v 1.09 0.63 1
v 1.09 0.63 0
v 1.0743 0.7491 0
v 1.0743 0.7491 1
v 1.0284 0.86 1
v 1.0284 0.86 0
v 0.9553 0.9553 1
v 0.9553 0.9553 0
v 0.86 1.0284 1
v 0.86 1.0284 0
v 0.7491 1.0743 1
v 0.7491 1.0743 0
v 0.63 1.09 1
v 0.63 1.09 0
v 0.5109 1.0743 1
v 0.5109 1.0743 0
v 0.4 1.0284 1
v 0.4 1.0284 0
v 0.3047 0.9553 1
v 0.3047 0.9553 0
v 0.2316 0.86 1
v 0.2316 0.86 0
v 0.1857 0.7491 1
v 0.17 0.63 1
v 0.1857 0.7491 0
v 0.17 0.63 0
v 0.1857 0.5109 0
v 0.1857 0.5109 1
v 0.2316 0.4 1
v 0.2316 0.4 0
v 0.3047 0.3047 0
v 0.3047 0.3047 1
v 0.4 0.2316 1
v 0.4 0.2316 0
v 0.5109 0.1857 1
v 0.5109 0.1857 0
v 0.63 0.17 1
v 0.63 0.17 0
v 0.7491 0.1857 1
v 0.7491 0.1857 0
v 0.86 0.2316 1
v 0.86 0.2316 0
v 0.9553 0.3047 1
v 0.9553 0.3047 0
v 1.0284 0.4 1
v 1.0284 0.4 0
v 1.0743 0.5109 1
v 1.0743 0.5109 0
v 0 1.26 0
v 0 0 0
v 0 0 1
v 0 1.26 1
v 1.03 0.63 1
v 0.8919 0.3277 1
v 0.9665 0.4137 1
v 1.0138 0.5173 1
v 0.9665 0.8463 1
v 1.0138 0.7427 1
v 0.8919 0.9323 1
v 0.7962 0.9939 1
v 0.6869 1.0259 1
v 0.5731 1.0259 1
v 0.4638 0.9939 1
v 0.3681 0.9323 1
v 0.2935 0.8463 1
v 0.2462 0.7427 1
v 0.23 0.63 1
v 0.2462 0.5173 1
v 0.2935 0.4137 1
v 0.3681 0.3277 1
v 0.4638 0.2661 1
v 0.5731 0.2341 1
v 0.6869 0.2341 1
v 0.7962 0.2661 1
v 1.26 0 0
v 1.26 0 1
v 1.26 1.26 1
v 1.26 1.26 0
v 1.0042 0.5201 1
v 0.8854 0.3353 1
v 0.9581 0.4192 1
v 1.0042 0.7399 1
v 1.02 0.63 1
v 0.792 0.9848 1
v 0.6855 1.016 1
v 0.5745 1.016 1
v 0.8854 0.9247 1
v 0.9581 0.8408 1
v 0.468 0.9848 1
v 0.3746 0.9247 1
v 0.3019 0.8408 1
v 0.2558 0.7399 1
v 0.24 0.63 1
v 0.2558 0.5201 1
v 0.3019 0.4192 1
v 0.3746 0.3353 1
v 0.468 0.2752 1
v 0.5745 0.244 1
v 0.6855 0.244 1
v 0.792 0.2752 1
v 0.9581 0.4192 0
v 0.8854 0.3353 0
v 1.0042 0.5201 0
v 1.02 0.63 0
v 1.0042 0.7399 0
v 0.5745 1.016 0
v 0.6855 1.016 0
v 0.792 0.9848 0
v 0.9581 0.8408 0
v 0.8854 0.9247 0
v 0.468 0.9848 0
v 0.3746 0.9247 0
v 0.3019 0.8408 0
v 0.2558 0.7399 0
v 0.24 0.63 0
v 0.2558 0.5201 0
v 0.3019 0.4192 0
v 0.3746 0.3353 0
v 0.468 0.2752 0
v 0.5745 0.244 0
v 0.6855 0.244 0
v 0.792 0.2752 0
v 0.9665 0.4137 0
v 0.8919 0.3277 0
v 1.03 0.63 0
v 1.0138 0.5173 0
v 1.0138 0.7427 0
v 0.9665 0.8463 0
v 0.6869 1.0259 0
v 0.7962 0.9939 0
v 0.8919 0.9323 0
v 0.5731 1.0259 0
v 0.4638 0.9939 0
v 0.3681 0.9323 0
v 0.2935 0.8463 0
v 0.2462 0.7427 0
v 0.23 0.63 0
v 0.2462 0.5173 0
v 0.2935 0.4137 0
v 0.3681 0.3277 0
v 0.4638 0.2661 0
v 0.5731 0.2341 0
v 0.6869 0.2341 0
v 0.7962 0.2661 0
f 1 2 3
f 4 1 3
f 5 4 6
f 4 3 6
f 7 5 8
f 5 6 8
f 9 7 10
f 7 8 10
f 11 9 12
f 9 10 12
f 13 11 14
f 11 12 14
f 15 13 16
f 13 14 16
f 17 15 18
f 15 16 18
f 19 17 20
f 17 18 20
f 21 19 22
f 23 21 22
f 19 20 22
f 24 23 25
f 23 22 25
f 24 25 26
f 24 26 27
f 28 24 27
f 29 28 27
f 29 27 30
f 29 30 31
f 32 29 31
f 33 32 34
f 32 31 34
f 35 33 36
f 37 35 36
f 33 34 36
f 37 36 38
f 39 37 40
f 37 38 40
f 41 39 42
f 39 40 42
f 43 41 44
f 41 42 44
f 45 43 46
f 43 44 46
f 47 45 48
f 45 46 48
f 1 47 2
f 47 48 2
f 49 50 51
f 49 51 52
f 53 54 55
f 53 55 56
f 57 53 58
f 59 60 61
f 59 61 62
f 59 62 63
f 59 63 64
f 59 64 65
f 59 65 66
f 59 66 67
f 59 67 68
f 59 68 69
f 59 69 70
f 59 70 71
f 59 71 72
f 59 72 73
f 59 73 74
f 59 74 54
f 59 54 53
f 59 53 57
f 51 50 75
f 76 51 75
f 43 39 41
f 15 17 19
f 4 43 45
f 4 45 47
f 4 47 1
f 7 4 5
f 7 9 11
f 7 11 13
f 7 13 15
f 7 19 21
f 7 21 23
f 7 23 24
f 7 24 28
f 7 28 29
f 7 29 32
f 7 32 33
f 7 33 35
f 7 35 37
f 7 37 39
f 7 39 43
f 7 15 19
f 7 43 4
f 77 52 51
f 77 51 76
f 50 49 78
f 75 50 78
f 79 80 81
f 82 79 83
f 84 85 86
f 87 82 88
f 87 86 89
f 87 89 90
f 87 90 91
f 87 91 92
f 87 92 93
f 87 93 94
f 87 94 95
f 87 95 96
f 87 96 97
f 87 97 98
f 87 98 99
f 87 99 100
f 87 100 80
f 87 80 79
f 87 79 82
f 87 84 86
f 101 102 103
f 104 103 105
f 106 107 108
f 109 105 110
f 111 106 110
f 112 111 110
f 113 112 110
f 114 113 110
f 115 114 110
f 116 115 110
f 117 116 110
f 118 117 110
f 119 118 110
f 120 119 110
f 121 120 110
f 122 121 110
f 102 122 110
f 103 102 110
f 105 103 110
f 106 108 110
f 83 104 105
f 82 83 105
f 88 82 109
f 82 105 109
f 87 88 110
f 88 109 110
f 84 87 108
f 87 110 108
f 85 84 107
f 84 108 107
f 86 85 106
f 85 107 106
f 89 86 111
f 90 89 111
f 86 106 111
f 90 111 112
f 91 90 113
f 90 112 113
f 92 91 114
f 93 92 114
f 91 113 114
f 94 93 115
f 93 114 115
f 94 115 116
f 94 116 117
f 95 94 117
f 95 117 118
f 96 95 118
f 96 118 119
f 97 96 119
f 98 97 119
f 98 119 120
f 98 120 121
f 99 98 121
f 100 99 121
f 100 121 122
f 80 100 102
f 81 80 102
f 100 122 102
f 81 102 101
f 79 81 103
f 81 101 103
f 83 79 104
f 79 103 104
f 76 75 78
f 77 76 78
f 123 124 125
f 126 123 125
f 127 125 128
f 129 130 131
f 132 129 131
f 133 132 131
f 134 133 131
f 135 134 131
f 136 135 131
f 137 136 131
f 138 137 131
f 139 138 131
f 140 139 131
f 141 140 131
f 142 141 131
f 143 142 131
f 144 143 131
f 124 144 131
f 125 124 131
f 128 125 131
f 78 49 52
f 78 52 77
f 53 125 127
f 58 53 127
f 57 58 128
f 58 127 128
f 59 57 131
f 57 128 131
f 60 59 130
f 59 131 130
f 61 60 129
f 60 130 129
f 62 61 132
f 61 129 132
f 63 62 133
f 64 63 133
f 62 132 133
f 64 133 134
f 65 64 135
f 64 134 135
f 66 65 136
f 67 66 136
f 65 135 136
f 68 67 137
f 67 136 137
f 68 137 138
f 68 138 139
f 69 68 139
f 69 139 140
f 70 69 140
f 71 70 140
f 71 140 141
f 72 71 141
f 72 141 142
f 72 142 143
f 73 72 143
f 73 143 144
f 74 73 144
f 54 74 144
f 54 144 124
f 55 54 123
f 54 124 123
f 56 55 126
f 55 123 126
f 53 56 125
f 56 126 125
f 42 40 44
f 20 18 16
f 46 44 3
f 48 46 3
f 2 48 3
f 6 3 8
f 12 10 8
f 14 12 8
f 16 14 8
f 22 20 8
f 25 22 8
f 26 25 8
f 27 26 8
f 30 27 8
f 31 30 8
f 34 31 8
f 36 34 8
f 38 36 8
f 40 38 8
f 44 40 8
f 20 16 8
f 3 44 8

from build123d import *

# Parameters (mm, degrees)
BOX_W             = 1.26
BOX_H             = 1.26
BOX_DEPTH         = 1
CYLINDER_R        = 0.39
CYLINDER_DEPTH    = 1
CYLINDER001_R     = 0.46
CYLINDER001_DEPTH = 1
CYLINDER002_R     = 0.4
CYLINDER002_DEPTH = 1


with BuildPart() as water_region:
    # Box → Box (new body)
    with BuildSketch(Plane.XY):
        with Locations((0.63, 0.63)):
            Rectangle(BOX_W, BOX_H)
    extrude(amount=BOX_DEPTH)


with BuildPart() as fuel_region:
    # Cylinder → Cylinder (new body)
    with BuildSketch(Plane(origin=(0.63, 0.63, 0), x_dir=(1, 0, 0), z_dir=(0, 0, 1))):
        Circle(CYLINDER_R)
    extrude(amount=CYLINDER_DEPTH)


with BuildPart() as clad_or:
    # Cylinder001 → Cylinder001 (new body)
    with BuildSketch(Plane(origin=(0.63, 0.63, 0), x_dir=(1, 0, 0), z_dir=(0, 0, 1))):
        Circle(CYLINDER001_R)
    extrude(amount=CYLINDER001_DEPTH)


with BuildPart() as clad_ir:
    # Cylinder002 → Cylinder002 (new body)
    with BuildSketch(Plane(origin=(0.63, 0.63, 0), x_dir=(1, 0, 0), z_dir=(0, 0, 1))):
        Circle(CYLINDER002_R)
    extrude(amount=CYLINDER002_DEPTH)


solid = Compound([water_region.part, fuel_region.part, clad_or.part, clad_ir.part])
